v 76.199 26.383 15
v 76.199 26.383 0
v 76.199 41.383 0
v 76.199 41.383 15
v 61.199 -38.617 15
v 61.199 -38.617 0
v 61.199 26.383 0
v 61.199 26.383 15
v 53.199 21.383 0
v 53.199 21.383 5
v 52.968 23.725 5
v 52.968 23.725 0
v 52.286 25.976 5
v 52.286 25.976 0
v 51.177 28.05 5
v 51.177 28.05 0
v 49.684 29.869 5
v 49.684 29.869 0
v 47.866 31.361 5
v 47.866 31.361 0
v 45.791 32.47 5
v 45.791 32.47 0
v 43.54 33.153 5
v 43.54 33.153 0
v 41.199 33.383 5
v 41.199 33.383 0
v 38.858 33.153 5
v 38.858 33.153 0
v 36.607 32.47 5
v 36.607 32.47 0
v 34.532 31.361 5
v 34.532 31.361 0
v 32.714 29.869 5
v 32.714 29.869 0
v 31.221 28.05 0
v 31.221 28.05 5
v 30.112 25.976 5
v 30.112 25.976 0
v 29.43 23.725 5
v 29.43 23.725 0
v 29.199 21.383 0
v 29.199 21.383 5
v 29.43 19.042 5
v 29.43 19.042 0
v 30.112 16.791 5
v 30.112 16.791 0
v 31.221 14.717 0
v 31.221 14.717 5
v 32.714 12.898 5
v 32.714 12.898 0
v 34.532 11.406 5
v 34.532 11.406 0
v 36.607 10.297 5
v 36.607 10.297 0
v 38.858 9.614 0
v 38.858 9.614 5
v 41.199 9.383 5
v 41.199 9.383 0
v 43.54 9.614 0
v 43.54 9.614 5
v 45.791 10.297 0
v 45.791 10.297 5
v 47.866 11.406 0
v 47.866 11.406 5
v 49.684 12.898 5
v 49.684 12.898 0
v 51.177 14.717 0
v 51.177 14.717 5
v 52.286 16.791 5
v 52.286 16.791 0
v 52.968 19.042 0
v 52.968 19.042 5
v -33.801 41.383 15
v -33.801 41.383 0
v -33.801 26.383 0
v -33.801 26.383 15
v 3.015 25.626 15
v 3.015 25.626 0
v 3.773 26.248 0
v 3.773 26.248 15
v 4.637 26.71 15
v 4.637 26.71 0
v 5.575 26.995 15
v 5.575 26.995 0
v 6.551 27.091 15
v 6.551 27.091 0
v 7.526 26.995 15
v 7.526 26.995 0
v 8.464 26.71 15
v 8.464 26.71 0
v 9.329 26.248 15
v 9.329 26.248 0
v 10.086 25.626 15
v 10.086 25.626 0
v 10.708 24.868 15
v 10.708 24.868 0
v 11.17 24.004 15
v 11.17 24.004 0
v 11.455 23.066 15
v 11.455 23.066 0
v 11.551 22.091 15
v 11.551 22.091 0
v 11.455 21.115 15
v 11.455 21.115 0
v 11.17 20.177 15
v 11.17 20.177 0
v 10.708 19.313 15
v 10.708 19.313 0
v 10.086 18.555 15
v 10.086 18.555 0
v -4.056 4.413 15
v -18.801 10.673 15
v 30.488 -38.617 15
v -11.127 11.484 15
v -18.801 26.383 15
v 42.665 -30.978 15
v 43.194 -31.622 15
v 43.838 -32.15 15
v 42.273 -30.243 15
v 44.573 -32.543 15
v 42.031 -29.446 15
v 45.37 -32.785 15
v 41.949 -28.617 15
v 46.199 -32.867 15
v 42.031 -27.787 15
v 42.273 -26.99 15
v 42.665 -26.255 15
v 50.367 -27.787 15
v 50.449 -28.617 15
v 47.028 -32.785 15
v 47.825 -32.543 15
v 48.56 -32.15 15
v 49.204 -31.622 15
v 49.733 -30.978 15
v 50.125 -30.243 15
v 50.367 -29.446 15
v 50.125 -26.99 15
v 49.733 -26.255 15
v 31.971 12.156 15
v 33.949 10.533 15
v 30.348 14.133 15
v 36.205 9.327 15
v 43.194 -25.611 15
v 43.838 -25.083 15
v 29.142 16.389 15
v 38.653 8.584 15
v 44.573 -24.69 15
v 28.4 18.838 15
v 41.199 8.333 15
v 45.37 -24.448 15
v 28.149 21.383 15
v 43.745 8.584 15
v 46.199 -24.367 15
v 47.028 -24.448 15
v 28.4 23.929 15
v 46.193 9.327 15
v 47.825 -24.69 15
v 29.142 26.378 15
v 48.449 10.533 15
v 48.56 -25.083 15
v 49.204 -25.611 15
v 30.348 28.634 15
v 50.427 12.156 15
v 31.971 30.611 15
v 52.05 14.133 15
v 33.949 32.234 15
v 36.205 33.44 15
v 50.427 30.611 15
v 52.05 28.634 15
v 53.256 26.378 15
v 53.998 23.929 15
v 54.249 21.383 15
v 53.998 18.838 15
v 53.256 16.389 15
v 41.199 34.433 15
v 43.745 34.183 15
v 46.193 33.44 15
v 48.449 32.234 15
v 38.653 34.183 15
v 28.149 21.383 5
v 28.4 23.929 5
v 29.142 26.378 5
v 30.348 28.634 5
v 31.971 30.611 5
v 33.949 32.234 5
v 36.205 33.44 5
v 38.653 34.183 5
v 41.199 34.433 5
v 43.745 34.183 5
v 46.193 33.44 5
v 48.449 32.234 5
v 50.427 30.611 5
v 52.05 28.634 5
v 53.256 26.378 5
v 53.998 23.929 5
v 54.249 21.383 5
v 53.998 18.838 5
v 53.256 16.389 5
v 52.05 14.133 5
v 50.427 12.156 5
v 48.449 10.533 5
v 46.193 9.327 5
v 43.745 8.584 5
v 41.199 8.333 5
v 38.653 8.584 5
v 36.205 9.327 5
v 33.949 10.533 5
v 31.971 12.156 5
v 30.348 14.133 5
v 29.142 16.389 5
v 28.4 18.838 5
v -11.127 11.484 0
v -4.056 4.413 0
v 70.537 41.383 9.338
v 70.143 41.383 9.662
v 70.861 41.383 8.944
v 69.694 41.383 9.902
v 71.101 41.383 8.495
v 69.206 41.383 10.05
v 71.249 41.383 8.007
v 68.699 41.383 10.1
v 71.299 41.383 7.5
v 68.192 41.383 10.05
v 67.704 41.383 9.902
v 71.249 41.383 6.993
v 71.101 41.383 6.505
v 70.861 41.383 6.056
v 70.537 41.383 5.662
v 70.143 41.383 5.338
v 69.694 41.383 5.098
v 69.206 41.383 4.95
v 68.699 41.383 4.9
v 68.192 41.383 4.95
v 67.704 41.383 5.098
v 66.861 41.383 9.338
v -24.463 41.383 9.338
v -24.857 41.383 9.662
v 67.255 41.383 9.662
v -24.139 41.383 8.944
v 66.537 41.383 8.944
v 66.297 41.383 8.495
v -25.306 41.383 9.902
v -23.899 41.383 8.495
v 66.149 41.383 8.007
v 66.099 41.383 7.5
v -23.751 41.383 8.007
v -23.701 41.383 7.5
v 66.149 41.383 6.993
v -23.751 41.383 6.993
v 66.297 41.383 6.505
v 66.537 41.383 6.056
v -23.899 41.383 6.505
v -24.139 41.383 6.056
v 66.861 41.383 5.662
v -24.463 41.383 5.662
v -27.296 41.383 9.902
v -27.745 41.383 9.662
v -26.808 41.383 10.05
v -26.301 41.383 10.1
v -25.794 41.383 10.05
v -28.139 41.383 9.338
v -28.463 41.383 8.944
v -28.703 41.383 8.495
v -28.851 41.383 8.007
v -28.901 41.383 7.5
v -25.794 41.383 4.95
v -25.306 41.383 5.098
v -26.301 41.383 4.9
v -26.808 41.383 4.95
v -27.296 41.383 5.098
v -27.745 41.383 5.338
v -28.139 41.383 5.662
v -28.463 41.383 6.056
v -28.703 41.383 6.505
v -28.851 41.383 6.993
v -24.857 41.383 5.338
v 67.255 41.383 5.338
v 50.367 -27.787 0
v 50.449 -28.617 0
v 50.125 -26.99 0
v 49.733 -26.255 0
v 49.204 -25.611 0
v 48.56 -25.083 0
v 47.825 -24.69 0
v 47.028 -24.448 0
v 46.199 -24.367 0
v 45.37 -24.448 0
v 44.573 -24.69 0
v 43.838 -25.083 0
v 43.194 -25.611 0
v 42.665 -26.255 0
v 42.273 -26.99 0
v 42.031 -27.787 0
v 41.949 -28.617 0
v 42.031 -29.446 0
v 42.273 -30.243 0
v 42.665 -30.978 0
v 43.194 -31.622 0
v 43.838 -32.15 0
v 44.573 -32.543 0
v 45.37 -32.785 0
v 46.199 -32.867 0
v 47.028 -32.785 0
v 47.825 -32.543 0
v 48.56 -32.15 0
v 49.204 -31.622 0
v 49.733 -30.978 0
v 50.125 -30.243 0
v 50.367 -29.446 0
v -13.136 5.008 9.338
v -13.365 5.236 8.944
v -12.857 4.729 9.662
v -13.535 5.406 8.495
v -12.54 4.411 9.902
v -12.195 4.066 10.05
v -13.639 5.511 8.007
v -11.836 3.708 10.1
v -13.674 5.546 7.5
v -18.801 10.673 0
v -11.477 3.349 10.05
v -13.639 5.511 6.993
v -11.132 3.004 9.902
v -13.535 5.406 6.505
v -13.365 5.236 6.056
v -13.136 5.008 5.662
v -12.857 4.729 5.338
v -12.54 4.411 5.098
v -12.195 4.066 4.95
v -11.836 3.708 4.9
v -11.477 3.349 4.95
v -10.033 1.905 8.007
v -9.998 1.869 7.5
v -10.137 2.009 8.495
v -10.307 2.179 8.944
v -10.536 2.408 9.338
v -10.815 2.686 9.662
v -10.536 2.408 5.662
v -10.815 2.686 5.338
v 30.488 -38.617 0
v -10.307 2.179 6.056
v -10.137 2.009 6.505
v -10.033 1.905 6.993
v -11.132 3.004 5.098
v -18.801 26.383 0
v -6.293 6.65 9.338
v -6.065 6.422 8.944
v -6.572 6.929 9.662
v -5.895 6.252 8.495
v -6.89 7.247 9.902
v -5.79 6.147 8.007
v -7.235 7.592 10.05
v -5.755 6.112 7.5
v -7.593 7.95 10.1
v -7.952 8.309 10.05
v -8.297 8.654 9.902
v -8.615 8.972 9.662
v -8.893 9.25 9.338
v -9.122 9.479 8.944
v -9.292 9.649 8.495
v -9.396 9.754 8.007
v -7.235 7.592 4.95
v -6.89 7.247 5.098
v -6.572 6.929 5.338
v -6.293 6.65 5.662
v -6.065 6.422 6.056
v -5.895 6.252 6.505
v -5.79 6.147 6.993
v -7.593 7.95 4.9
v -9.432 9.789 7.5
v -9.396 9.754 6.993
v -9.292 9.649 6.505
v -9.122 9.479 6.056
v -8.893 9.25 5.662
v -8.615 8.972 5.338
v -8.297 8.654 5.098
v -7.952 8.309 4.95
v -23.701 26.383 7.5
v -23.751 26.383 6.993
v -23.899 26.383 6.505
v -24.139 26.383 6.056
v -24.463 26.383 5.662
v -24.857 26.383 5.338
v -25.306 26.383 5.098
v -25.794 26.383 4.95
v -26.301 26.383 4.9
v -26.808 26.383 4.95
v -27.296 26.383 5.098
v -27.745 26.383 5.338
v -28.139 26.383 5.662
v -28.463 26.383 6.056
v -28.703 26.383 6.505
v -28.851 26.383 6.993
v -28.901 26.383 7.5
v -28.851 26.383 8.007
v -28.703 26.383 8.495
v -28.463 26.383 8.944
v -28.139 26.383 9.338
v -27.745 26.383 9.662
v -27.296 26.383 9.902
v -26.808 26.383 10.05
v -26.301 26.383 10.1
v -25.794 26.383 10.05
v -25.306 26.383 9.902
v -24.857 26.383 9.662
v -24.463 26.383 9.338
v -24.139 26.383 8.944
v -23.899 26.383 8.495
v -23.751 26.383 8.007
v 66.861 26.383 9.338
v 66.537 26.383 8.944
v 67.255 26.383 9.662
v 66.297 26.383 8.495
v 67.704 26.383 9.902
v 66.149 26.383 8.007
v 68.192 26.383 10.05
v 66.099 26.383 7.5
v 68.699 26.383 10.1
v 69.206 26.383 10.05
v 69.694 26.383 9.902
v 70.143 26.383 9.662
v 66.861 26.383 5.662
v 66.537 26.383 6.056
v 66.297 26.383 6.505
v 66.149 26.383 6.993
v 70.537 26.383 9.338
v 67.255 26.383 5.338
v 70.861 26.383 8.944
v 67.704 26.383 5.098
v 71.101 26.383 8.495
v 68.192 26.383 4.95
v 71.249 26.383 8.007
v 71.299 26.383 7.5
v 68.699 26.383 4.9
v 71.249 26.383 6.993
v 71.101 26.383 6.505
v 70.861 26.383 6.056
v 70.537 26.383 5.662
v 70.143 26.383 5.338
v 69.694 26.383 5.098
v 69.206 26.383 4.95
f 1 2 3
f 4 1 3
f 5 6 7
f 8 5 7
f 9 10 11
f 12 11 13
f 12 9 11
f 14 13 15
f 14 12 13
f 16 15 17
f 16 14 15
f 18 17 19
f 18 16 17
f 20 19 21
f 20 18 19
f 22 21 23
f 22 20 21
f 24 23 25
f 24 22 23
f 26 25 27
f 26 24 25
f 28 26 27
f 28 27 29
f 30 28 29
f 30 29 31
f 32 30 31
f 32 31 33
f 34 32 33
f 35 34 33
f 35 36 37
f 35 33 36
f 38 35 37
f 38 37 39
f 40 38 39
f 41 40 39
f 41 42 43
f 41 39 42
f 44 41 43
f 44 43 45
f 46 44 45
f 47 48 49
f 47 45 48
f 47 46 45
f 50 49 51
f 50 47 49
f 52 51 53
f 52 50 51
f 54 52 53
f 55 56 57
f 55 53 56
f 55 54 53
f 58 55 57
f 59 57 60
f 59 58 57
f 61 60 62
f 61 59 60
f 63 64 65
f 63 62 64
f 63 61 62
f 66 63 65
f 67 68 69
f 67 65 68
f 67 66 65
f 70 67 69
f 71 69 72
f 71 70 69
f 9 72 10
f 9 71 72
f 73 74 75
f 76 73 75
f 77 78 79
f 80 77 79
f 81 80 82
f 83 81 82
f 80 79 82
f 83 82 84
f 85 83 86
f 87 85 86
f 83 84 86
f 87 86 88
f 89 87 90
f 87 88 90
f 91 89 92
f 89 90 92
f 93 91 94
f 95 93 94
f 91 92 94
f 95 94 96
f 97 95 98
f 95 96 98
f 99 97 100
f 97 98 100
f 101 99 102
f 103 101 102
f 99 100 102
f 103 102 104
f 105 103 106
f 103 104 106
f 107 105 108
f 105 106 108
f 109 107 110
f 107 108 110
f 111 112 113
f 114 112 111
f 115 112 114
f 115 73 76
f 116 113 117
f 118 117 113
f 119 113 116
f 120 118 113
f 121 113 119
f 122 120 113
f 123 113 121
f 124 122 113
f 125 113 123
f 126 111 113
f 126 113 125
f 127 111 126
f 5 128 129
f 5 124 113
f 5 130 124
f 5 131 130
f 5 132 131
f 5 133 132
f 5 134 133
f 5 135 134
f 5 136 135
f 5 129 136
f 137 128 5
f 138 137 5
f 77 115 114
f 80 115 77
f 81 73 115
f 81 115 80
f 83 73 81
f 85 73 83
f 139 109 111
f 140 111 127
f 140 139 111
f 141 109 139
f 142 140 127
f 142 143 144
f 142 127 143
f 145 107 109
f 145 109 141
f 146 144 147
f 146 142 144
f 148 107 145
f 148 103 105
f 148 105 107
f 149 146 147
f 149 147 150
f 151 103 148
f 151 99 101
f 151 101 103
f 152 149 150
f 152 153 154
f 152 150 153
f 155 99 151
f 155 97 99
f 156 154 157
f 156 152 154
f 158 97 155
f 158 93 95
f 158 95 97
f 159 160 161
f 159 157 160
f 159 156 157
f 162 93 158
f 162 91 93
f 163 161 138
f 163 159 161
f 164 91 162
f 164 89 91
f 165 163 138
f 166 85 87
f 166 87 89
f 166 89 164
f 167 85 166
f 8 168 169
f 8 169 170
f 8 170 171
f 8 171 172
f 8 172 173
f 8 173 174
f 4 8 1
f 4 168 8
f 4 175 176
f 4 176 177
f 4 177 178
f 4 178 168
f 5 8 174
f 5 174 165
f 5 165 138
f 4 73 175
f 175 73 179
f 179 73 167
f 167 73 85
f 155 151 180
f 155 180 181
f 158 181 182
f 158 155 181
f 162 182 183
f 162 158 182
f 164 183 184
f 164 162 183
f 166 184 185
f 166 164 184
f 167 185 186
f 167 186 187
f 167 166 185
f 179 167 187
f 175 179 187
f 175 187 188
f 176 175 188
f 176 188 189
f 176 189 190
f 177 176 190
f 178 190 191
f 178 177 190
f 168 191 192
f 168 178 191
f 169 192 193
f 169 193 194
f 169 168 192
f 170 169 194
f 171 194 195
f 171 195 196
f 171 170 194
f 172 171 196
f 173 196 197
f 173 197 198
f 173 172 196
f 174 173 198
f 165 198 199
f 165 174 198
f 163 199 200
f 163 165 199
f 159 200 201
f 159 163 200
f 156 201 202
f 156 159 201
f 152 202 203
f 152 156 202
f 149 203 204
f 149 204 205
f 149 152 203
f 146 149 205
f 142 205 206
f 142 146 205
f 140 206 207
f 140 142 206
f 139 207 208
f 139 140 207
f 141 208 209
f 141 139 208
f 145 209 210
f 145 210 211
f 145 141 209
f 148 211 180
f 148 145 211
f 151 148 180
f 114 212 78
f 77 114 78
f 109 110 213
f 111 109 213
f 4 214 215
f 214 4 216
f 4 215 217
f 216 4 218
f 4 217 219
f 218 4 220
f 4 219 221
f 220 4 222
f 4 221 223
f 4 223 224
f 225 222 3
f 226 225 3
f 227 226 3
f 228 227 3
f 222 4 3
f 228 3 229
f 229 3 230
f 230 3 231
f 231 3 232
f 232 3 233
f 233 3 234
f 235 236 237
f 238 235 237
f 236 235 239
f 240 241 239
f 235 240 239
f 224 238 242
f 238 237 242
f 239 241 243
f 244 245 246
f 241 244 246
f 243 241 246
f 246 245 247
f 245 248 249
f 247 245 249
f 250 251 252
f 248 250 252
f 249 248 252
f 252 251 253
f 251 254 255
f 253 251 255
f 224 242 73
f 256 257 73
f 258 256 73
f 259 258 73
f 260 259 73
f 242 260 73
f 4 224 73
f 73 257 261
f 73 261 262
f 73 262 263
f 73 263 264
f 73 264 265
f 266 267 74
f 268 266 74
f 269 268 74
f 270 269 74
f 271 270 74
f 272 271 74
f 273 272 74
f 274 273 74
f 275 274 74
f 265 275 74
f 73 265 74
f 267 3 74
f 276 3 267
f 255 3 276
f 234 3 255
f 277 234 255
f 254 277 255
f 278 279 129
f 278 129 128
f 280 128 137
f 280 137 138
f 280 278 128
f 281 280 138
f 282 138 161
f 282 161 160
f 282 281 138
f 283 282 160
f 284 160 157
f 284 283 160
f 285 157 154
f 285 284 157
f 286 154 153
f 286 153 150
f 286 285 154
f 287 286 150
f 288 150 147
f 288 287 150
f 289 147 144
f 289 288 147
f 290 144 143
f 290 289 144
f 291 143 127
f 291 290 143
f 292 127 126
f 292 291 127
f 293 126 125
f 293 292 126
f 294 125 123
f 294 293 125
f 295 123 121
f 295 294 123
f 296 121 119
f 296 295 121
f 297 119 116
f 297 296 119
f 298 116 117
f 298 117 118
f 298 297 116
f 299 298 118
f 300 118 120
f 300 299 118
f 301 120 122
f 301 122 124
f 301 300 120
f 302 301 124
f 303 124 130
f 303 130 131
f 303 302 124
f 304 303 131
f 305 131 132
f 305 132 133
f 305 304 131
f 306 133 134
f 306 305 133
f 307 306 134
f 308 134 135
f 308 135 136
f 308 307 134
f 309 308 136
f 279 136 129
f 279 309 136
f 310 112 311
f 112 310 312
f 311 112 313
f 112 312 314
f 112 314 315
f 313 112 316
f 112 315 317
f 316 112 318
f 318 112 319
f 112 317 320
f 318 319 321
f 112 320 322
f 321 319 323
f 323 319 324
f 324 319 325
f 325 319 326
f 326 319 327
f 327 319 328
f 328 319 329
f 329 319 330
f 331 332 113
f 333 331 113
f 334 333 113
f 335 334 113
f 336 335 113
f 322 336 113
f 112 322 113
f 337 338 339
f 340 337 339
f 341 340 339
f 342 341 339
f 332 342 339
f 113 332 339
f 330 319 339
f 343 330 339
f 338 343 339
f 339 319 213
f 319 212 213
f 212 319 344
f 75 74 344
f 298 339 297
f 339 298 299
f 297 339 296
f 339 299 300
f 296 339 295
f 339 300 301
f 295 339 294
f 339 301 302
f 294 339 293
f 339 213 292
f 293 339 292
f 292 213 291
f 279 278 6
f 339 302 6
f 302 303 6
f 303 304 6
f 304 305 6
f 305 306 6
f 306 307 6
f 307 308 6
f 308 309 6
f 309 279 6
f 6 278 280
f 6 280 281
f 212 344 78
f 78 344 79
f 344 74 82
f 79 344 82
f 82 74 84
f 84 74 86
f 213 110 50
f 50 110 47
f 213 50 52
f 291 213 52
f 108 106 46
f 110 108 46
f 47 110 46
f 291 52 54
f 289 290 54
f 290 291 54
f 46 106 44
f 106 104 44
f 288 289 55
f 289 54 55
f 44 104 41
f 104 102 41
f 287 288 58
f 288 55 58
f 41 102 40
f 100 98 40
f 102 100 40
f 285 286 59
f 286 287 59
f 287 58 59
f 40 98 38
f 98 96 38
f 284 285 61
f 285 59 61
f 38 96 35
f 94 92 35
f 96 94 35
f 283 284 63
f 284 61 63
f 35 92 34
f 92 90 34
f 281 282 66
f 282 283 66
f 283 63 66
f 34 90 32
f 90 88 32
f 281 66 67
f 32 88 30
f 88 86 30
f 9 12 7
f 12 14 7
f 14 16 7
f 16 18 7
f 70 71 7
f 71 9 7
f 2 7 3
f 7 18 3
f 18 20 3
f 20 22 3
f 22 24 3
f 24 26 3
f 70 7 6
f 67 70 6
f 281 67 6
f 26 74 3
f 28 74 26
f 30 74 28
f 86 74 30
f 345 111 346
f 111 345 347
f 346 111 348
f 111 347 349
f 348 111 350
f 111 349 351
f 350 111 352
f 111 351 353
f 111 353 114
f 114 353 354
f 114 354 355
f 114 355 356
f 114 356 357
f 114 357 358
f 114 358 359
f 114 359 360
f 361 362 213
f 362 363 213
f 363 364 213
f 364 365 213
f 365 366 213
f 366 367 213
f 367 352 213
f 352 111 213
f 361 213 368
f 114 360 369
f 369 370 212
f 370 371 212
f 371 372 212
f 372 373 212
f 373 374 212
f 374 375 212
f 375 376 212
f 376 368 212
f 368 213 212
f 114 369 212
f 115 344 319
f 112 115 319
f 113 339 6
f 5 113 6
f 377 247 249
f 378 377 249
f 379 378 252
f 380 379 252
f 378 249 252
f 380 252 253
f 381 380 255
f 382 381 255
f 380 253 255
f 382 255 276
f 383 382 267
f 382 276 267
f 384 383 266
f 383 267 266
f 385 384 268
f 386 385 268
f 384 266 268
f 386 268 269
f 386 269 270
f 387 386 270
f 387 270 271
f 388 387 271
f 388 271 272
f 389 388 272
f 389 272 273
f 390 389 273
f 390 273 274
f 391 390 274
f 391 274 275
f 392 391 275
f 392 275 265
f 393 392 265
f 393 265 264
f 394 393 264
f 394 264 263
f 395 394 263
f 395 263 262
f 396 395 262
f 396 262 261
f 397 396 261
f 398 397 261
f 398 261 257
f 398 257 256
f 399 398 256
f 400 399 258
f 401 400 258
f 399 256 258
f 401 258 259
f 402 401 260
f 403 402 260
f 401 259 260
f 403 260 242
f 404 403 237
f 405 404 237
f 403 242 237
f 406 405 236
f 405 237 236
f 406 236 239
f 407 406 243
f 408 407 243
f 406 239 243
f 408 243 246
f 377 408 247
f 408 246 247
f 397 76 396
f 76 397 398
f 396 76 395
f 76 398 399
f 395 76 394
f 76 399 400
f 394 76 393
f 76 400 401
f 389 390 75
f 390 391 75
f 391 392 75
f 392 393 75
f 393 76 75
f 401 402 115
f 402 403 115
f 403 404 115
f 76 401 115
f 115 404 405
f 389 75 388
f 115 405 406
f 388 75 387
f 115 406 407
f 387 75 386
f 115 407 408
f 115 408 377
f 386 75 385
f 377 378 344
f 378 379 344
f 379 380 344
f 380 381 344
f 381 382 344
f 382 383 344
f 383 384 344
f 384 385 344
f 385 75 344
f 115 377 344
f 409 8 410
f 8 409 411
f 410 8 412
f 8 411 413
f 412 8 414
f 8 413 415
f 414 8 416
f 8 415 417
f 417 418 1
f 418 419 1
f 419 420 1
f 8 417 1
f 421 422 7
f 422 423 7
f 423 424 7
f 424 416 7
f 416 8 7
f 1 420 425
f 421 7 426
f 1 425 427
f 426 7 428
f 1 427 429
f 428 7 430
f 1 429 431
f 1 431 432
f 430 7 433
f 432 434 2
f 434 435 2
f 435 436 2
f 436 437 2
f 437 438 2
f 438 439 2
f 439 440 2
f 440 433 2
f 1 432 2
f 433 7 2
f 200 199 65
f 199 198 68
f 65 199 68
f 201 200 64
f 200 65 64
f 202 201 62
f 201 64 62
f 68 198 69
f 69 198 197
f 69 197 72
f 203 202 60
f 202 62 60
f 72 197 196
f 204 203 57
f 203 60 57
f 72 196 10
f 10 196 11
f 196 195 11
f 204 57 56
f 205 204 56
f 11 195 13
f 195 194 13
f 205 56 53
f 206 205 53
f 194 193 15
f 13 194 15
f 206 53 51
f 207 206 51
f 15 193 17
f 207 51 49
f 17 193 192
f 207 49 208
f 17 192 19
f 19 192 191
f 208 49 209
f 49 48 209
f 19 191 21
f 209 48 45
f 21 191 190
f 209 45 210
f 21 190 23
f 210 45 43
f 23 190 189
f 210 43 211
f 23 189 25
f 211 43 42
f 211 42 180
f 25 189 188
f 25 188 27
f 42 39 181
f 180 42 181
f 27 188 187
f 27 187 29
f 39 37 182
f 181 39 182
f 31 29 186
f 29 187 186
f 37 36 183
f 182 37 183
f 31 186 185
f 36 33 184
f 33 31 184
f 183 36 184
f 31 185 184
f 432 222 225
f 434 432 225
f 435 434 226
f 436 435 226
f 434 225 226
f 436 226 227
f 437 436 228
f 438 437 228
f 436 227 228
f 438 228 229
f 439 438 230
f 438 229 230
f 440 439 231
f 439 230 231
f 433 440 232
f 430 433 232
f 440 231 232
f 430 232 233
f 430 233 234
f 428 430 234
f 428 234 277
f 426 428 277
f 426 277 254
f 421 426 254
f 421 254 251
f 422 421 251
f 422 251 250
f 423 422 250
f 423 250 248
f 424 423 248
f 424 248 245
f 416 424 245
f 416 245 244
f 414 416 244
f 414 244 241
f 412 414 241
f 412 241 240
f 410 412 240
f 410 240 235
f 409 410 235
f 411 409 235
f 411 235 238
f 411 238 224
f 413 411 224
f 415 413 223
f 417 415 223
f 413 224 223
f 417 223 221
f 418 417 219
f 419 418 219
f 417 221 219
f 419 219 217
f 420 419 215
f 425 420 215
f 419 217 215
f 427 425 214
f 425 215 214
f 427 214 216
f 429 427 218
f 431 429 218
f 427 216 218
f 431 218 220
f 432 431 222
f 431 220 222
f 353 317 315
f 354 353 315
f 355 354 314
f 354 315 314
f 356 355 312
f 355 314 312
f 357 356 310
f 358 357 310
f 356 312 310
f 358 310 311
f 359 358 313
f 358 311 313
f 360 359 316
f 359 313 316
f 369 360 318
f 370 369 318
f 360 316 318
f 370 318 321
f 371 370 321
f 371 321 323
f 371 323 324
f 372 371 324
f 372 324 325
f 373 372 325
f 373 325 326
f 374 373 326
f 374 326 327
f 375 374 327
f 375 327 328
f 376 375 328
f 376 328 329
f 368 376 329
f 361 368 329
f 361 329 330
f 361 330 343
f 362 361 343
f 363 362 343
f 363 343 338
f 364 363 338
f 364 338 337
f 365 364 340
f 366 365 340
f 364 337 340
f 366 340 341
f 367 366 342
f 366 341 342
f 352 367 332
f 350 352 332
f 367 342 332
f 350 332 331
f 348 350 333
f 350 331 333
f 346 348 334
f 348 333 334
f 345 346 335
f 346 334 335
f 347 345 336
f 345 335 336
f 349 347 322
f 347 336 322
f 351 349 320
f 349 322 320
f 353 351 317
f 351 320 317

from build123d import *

# Parameters (mm, degrees)
SKETCH_1_R          = 12
SKETCH_1_R_2        = 4.25
EXTRUDE_1_DEPTH     = 15
SKETCH_2_R          = 13.05
CUT_EXTRUDE_1_DEPTH = 10
SKETCH_3_R          = 2.6
CUT_EXTRUDE_2_DEPTH = 81
SKETCH_5_R          = 2.6
CUT_EXTRUDE_3_DEPTH = 10


with BuildPart() as part:
    # 草图1 → 凸台-拉伸1 (new body)
    with BuildSketch(Plane.XY):
        Polygon((-33.800989673, 26.383498279), (-27.44059998, 26.383498279), (-18.800989673, 26.383498279), (-18.800989673, 10.67282016), (30.488332208, -38.616501721), (61.199010327, -38.616501721), (61.199010327, 26.383498279), (76.199010327, 26.383498279), (76.199010327, 41.383498279), (56.199010327, 41.383498279), (-33.800989673, 41.383498279), align=None)
        with Locations((41.199010327, 21.383498279)):
            Circle(SKETCH_1_R, mode=Mode.SUBTRACT)
        with Locations((46.199010327, -28.616501721)):
            Circle(SKETCH_1_R_2, mode=Mode.SUBTRACT)
        with BuildLine():
            Line((-11.126891481, 11.484003342), (3.015244143, 25.626138966))
            ThreePointArc((3.015244143, 25.626138966), (10.086311955, 25.626138966), (10.086311955, 18.555071154))
            Line((10.086311955, 18.555071154), (-4.055823669, 4.41293553))
            Line((-4.055823669, 4.41293553), (-11.126891481, 11.484003342))
        make_face(mode=Mode.SUBTRACT)
    extrude(amount=EXTRUDE_1_DEPTH)

    # 草图2 → 切除-拉伸1 (cut)
    with BuildSketch(Plane(origin=(0, 0, 15), x_dir=(-1, 0, 0), z_dir=(0, 0, -1))):
        with Locations((-41.199010327, 21.383498279)):
            Circle(SKETCH_2_R)
    extrude(amount=CUT_EXTRUDE_1_DEPTH, mode=Mode.SUBTRACT)

    # 草图3 → 切除-拉伸2 (cut, through all)
    with BuildSketch(Plane(origin=(0, 41.383498279, 0), x_dir=(1, 0, 0), z_dir=(0, 1, 0))):
        with Locations((-26.300989673, -7.5)):
            Circle(SKETCH_3_R)
        with Locations((68.699010327, -7.5)):
            Circle(SKETCH_3_R)
    extrude(amount=-CUT_EXTRUDE_2_DEPTH, mode=Mode.SUBTRACT)

    # 草图5 → 切除-拉伸3 (cut)
    with BuildSketch(Plane(origin=(-4.064084756, -4.064084756, 0), x_dir=(0, 0, 1), z_dir=(-0.707106781, -0.707106781, 0))):
        with Locations((7.5, 10.9911308)):
            Circle(SKETCH_5_R)
    extrude(amount=-CUT_EXTRUDE_3_DEPTH, mode=Mode.SUBTRACT)


solid = part.part
